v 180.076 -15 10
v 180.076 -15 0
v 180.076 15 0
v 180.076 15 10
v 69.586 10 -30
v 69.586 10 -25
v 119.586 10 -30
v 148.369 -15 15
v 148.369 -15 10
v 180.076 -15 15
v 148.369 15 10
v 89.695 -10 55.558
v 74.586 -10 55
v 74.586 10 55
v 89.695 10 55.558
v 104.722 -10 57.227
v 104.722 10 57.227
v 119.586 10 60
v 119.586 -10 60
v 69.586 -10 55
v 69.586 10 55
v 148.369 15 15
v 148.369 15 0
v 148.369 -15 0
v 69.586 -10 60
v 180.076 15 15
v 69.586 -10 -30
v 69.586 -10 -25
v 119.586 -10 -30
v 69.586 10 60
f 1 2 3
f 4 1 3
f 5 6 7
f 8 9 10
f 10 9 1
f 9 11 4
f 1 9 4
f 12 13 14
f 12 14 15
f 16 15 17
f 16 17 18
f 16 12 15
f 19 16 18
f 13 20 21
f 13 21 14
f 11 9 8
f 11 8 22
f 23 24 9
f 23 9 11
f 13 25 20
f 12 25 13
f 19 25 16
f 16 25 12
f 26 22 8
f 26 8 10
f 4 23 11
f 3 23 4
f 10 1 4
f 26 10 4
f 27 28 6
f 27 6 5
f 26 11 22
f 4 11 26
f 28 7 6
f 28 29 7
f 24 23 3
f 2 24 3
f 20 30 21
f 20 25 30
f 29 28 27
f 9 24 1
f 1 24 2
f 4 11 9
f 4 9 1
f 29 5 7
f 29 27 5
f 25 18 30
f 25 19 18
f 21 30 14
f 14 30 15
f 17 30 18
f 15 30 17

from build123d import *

# Parameters (mm, degrees)
F1_DEPTH = 10
F2_W     = 31.7073058904
F2_H     = 30
F3_DEPTH = 10
F4_DEPTH = 5


# Not quite as in the source:
# - a feature names something its author has since deleted; it is built from what else it names


with BuildPart() as f1:
    # F0 (on Front) → F1 (new body, symmetric)
    with BuildSketch(Plane.XZ):
        with BuildLine():
            Line((69.5857927203, 60), (69.5857927203, 55))
            Line((69.5857927203, 55), (74.5857927203, 55))
            ThreePointArc((74.5857927203, 55), (97.2242555657, 56.2538343919), (119.5857927203, 60))
            Line((119.5857927203, 60), (69.5857927203, 60))
        make_face()
    extrude(amount=F1_DEPTH, both=True)


with BuildPart() as f1b:
    # F0 (on Front) → F1, piece 2 (new body, symmetric)
    with BuildSketch(Plane.XZ):
        Polygon((119.5857927203, -30), (69.5857927203, -25), (69.5857927203, -30), align=None)
    extrude(amount=F1_DEPTH, both=True)


with BuildPart() as f3:
    # F2 (on Top) → F3 (new body)
    with BuildSketch(Plane.XY):
        with Locations((164.2224490643, 0)):
            Rectangle(F2_W, F2_H)
    extrude(amount=F3_DEPTH)


with BuildPart() as f4:
    # F4 (new): a face of the model
    f4_faces = [f3.part.faces().sort_by_distance(p)[0] for p in [
        (164.2224490643, 0, 10),
    ]]
    extrude(f4_faces, amount=F4_DEPTH)


solid = Compound([f1.part, f1b.part, f3.part, f4.part])
